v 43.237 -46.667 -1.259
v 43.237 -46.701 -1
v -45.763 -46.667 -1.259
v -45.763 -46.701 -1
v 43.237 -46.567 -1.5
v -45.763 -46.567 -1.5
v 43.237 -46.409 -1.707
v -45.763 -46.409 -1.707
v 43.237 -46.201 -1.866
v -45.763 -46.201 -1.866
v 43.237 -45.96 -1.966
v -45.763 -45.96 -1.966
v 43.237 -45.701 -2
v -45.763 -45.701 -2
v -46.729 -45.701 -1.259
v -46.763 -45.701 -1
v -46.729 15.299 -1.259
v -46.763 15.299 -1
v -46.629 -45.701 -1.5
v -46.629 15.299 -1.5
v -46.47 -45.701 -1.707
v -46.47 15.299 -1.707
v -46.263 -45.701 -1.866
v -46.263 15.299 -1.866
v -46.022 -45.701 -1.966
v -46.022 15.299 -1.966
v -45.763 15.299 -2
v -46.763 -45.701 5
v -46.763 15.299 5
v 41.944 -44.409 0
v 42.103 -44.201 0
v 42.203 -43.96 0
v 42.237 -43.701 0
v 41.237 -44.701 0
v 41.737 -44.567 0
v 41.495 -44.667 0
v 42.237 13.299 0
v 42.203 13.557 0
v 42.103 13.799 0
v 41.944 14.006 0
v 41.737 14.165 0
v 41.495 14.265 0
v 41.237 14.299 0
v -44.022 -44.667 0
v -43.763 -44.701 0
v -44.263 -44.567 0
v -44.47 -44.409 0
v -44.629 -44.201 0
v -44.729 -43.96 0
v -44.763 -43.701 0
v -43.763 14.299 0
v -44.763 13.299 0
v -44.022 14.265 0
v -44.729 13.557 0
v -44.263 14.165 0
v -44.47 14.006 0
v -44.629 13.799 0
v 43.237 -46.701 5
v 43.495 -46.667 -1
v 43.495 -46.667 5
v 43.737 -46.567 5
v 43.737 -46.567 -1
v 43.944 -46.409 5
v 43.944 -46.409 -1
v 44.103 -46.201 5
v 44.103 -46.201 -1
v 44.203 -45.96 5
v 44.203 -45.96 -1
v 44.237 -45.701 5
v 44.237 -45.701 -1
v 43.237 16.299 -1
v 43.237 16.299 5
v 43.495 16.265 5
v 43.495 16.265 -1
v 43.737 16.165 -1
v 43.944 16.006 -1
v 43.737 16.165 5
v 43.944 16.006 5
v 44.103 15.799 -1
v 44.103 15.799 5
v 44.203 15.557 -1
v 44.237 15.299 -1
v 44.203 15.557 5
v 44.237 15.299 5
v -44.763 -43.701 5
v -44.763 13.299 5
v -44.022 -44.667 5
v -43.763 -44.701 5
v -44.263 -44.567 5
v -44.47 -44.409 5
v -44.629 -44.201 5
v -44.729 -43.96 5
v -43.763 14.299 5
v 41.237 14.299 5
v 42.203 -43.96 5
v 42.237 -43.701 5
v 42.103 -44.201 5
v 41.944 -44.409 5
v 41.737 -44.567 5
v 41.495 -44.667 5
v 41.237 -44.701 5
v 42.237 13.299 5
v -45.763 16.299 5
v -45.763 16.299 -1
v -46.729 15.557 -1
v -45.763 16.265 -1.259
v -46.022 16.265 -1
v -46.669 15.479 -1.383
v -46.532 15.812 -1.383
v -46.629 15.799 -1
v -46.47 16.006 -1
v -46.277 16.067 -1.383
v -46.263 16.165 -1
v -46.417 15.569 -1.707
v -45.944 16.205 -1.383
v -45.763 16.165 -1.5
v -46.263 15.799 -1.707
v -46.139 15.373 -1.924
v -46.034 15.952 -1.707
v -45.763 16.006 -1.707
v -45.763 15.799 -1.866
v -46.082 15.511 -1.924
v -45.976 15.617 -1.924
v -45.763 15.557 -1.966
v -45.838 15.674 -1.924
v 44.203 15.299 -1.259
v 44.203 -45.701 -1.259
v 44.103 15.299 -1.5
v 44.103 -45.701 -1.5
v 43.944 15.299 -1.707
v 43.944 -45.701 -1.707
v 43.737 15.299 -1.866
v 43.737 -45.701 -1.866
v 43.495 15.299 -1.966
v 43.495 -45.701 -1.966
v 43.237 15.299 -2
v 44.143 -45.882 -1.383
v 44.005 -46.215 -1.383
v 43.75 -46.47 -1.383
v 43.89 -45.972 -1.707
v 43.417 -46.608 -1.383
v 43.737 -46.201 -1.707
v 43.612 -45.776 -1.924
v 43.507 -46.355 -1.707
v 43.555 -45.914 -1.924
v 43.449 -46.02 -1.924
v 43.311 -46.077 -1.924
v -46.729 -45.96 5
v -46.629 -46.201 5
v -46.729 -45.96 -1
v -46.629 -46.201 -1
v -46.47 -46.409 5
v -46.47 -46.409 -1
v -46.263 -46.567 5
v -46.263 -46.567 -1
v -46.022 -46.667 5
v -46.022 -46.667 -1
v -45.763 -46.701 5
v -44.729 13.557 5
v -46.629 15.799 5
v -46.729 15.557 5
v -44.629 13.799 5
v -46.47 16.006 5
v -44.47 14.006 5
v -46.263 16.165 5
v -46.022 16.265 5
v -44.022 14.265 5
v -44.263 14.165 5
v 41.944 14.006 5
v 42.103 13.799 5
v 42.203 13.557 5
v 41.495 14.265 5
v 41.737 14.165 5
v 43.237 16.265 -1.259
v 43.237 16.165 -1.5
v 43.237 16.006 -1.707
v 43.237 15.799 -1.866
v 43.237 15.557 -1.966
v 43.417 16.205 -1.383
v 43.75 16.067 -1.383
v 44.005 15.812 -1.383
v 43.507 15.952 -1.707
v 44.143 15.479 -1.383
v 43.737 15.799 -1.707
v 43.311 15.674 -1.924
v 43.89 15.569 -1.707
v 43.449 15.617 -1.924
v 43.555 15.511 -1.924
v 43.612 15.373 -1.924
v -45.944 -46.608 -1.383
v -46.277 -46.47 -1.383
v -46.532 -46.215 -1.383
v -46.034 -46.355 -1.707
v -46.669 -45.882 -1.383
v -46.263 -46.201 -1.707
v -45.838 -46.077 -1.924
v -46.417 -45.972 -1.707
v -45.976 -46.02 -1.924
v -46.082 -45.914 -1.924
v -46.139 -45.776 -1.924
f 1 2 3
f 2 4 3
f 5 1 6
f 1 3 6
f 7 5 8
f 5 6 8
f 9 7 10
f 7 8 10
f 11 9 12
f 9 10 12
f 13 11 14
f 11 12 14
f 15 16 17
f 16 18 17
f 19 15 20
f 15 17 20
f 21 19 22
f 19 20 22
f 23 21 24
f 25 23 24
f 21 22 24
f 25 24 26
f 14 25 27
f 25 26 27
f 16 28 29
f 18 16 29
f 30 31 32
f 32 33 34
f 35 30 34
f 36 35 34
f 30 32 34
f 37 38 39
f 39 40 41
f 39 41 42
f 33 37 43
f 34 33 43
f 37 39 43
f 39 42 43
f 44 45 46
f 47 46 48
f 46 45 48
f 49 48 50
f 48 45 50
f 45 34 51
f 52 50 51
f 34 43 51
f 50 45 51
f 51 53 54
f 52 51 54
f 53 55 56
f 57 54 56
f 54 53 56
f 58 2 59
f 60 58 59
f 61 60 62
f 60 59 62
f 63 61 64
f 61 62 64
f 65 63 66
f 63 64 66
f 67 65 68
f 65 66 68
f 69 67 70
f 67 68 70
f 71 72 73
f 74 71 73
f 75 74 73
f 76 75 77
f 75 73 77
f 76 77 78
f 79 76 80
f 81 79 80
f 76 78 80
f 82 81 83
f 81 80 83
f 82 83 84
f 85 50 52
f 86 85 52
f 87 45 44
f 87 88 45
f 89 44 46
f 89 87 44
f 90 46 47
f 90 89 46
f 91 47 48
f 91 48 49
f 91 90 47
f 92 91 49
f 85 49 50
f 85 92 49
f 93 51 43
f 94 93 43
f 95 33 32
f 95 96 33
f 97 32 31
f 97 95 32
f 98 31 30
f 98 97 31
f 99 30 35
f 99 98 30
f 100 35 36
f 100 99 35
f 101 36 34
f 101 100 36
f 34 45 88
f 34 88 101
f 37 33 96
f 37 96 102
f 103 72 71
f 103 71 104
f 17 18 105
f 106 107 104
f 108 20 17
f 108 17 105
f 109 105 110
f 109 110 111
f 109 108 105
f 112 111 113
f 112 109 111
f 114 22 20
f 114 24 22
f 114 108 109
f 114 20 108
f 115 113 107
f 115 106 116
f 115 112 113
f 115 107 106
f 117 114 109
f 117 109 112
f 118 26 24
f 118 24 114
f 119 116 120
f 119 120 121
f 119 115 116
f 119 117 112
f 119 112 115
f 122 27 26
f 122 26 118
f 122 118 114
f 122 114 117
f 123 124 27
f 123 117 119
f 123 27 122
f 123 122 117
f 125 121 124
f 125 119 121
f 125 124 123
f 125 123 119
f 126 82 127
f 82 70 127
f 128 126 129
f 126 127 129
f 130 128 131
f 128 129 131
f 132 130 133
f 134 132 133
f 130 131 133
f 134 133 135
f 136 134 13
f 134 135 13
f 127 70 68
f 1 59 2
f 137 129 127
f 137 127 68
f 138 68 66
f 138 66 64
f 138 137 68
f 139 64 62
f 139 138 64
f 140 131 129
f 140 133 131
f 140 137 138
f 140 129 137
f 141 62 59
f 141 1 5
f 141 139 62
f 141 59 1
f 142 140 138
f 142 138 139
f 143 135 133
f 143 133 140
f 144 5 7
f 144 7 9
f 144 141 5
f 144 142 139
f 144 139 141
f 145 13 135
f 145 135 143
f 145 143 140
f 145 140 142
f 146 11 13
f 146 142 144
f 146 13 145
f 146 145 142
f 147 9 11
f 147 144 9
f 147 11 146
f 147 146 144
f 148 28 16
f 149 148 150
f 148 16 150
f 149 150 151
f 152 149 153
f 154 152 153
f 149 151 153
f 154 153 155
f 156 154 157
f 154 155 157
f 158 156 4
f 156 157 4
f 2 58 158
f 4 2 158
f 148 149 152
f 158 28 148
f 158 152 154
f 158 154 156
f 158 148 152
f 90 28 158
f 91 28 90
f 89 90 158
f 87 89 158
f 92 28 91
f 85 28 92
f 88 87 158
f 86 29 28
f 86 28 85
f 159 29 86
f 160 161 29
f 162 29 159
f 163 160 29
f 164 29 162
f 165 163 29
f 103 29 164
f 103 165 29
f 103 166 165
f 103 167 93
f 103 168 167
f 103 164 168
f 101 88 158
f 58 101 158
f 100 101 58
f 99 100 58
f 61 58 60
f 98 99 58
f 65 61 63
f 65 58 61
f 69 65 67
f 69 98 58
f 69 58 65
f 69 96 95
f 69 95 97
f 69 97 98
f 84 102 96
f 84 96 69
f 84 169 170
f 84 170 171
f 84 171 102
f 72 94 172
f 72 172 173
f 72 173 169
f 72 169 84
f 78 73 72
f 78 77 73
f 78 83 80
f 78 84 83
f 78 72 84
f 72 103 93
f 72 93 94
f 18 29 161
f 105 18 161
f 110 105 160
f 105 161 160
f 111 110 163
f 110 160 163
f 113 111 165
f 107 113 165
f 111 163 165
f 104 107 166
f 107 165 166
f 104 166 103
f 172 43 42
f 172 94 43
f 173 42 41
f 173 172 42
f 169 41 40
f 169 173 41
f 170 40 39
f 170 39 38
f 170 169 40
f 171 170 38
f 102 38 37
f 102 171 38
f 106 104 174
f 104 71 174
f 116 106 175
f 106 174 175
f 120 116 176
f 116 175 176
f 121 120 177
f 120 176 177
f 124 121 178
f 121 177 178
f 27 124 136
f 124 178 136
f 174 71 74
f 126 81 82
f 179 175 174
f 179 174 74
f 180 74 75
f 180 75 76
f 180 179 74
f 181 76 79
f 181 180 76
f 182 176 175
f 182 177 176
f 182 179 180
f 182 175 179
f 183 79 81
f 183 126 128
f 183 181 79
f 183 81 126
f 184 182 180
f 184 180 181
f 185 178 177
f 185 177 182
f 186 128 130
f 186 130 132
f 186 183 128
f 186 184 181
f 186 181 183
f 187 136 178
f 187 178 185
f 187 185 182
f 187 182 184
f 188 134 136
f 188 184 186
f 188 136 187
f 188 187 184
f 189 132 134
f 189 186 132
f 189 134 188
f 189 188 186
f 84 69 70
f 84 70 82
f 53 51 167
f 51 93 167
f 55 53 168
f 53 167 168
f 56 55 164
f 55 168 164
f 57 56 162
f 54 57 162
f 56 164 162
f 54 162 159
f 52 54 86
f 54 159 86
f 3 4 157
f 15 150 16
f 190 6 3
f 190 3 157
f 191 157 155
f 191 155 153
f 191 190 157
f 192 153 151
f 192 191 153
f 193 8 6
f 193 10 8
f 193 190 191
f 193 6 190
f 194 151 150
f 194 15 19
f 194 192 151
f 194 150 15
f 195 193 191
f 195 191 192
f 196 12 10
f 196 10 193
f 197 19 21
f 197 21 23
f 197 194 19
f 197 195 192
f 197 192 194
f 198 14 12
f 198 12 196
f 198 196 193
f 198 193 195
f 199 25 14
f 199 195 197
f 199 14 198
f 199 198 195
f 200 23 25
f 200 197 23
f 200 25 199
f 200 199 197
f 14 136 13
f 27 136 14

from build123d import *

# Parameters (mm, degrees)
ESBO_O1_W                = 91
ESBO_O1_H                = 63
ESBO_O1_W_2              = 87
ESBO_O1_H_2              = 59
RESSALTO_EXTRUS_O1_DEPTH = 5
ESBO_O2_W                = 91
ESBO_O2_H                = 63
RESSALTO_EXTRUS_O2_DEPTH = 2
FILETE6_R                = 1
FILETE7_R                = 1
FILETE10_R               = 1
FILETE11_R               = 1
FILETE12_R               = 1


with BuildPart() as part:
    # Esboço1 → Ressalto-extrusão1 (new body)
    with BuildSketch(Plane.XY):
        with Locations((-1.263340114, -15.201421801)):
            Rectangle(ESBO_O1_W, ESBO_O1_H)
        with Locations((-1.263340114, -15.201421801)):
            Rectangle(ESBO_O1_W_2, ESBO_O1_H_2, mode=Mode.SUBTRACT)
    extrude(amount=RESSALTO_EXTRUS_O1_DEPTH)

    # Esboço2 → Ressalto-extrusão2 (add)
    with BuildSketch(Plane(origin=(0, 0, 0), x_dir=(-1, 0, 0), z_dir=(0, 0, -1))):
        with Locations((1.263340114, -15.201421801)):
            Rectangle(ESBO_O2_W, ESBO_O2_H)
    extrude(amount=RESSALTO_EXTRUS_O2_DEPTH)

    # Filete6
    filete6_edges = [part.edges().sort_by_distance(p)[0] for p in [
        (42.236659886, 14.298578199, 2.5),
    ]]
    fillet(filete6_edges, radius=FILETE6_R)

    # Filete7
    filete7_edges = [part.edges().sort_by_distance(p)[0] for p in [
        (-44.763340114, 14.298578199, 2.5),
        (-44.763340114, -44.701421801, 2.5),
        (42.236659886, -44.701421801, 2.5),
    ]]
    fillet(filete7_edges, radius=FILETE7_R)

    # Filete10
    filete10_edges = [part.edges().sort_by_distance(p)[0] for p in [
        (-46.763340114, -46.701421801, 1.5),
    ]]
    fillet(filete10_edges, radius=FILETE10_R)

    # Filete11
    filete11_edges = [part.edges().sort_by_distance(p)[0] for p in [
        (-46.763340114, 16.298578199, 1.5),
        (44.236659886, 16.298578199, 1.5),
        (44.236659886, -46.701421801, 1.5),
    ]]
    fillet(filete11_edges, radius=FILETE11_R)

    # Filete12
    filete12_edges = [part.edges().sort_by_distance(p)[0] for p in [
        (-46.763340114, -15.201421801, -2),
        (-46.470446895, -46.408528582, -2),
        (44.236659886, -15.201421801, -2),
        (-1.263340114, -46.701421801, -2),
        (-1.263340114, 16.298578199, -2),
        (-46.470446895, 16.00568498, -2),
        (43.943766667, 16.00568498, -2),
        (43.943766667, -46.408528582, -2),
    ]]
    fillet(filete12_edges, radius=FILETE12_R)


solid = part.part
